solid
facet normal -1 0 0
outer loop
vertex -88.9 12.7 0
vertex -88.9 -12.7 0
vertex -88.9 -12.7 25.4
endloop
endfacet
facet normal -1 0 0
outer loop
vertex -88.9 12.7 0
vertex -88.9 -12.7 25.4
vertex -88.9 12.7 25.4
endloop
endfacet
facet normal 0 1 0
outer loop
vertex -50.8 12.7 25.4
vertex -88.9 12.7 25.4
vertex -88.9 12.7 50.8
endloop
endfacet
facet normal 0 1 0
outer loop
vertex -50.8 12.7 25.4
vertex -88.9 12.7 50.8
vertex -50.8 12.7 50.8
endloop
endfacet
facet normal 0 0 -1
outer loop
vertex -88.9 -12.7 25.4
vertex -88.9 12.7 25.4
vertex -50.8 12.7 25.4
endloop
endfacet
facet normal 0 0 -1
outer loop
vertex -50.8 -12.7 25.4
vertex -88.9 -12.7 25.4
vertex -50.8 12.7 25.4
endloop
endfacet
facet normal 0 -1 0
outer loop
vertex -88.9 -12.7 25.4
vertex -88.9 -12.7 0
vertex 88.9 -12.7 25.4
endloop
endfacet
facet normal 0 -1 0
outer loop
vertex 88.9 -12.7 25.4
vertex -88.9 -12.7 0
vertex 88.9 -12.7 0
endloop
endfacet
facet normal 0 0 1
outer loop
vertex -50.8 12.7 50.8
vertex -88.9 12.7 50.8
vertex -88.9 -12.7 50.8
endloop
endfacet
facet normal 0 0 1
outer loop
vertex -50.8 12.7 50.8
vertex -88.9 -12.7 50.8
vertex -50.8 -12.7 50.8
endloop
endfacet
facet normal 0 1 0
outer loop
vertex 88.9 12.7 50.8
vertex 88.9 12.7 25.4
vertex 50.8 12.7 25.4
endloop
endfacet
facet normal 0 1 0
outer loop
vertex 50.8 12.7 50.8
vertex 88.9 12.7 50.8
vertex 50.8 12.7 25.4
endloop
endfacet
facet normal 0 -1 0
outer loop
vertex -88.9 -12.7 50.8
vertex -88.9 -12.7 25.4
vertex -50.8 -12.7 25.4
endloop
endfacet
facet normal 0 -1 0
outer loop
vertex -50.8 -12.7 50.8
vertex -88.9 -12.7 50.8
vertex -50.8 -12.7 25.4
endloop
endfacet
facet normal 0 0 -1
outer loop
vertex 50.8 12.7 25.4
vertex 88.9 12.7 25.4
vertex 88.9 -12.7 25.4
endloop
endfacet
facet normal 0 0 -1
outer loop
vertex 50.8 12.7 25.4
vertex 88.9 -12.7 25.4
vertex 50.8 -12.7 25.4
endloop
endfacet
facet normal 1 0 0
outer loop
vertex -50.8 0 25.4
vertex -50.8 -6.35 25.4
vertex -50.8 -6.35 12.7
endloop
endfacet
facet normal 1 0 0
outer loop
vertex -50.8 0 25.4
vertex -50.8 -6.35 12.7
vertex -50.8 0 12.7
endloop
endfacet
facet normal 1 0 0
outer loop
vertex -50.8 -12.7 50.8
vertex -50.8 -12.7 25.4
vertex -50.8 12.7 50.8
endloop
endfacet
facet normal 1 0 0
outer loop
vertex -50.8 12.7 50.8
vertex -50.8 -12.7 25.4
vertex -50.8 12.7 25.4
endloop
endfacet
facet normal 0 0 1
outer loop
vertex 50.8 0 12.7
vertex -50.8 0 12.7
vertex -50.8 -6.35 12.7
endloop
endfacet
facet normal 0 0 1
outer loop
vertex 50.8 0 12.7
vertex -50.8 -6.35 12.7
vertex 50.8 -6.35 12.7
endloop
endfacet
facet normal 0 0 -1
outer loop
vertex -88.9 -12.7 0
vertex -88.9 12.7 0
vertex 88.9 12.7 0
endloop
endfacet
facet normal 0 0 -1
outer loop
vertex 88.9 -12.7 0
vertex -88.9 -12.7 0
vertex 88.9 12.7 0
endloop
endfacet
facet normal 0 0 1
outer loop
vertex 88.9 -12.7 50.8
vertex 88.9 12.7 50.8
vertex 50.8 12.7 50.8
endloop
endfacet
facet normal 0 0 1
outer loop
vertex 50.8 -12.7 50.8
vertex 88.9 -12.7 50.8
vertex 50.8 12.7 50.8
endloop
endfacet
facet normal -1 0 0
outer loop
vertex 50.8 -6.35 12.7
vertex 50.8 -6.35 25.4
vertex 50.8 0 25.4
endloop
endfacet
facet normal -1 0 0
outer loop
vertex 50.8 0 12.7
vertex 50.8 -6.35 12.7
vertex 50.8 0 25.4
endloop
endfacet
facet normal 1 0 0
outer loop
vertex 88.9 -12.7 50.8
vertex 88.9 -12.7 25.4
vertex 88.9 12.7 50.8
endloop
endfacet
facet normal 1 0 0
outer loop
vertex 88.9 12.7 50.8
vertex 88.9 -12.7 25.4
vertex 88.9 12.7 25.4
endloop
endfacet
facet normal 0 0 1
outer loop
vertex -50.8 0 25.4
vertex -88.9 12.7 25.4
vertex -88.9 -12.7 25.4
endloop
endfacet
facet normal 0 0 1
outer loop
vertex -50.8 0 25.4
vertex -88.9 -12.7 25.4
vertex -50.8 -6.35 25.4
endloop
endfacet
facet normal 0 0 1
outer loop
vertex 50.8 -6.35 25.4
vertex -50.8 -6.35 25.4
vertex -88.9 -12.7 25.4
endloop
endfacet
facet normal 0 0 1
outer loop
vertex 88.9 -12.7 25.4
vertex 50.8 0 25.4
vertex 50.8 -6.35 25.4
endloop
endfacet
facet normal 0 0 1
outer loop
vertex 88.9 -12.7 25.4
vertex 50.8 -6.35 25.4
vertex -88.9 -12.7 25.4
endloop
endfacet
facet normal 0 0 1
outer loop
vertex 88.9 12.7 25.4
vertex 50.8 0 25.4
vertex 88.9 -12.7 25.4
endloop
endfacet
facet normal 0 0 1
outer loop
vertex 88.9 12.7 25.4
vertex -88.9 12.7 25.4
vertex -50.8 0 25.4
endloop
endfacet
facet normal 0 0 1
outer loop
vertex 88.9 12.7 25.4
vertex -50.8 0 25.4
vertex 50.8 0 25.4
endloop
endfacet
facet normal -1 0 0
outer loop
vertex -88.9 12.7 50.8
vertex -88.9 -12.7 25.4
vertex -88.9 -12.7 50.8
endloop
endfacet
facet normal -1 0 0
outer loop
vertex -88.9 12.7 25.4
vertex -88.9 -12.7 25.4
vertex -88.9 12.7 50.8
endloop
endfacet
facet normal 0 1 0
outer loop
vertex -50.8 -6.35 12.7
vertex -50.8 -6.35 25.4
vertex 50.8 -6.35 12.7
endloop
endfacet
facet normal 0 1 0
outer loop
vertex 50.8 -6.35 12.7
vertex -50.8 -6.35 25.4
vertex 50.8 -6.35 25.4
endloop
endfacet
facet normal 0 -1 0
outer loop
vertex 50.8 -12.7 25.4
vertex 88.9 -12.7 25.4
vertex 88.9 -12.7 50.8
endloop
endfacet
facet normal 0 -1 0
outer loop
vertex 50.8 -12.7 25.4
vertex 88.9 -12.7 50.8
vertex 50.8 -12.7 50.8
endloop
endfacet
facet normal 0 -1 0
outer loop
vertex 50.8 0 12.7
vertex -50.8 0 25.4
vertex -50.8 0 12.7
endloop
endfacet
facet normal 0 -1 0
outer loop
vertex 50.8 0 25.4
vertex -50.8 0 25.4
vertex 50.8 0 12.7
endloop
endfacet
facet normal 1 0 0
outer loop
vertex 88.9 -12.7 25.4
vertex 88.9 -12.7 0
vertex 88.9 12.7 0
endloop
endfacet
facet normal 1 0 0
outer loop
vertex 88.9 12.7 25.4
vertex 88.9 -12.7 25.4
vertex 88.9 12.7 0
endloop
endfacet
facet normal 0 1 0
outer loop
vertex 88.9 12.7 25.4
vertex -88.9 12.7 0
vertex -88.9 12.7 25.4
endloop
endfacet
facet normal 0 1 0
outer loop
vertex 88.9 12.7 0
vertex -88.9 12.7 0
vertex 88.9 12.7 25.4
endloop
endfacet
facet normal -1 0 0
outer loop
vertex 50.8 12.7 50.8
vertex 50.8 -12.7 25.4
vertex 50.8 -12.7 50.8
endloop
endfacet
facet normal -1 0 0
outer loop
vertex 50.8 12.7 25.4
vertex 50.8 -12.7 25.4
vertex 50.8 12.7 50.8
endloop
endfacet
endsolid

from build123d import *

# Parameters (mm, degrees)
F0_W     = 177.8
F0_H     = 25.4
F1_DEPTH = 25.4
F2_W     = 38.1
F2_H     = 25.4
F3_DEPTH = 25.4
F5_W     = 101.6
F5_H     = 6.35
F6_DEPTH = 12.7


with BuildPart() as f1:
    # F0 (on Top) → F1 (new body)
    with BuildSketch(Plane.XY):
        Rectangle(F0_W, F0_H)
    extrude(amount=F1_DEPTH)

    # F5 (on face) → F6 (cut)
    with BuildSketch(Plane.XY.offset(25.4)):
        with Locations((0, -3.175)):
            Rectangle(F5_W, F5_H)
    extrude(amount=-F6_DEPTH, mode=Mode.SUBTRACT)


with BuildPart() as f3:
    # F2 (on face) → F3 (new body)
    with BuildSketch(Plane.XY.offset(25.4)):
        with Locations((-69.85, 0)):
            Rectangle(F2_W, F2_H)
    extrude(amount=F3_DEPTH)


with BuildPart() as f4_1:
    # F4: instance of F3
    add(f3.part.mirror(Plane.YZ))


solid = Compound([f1.part, f3.part, f4_1.part])
